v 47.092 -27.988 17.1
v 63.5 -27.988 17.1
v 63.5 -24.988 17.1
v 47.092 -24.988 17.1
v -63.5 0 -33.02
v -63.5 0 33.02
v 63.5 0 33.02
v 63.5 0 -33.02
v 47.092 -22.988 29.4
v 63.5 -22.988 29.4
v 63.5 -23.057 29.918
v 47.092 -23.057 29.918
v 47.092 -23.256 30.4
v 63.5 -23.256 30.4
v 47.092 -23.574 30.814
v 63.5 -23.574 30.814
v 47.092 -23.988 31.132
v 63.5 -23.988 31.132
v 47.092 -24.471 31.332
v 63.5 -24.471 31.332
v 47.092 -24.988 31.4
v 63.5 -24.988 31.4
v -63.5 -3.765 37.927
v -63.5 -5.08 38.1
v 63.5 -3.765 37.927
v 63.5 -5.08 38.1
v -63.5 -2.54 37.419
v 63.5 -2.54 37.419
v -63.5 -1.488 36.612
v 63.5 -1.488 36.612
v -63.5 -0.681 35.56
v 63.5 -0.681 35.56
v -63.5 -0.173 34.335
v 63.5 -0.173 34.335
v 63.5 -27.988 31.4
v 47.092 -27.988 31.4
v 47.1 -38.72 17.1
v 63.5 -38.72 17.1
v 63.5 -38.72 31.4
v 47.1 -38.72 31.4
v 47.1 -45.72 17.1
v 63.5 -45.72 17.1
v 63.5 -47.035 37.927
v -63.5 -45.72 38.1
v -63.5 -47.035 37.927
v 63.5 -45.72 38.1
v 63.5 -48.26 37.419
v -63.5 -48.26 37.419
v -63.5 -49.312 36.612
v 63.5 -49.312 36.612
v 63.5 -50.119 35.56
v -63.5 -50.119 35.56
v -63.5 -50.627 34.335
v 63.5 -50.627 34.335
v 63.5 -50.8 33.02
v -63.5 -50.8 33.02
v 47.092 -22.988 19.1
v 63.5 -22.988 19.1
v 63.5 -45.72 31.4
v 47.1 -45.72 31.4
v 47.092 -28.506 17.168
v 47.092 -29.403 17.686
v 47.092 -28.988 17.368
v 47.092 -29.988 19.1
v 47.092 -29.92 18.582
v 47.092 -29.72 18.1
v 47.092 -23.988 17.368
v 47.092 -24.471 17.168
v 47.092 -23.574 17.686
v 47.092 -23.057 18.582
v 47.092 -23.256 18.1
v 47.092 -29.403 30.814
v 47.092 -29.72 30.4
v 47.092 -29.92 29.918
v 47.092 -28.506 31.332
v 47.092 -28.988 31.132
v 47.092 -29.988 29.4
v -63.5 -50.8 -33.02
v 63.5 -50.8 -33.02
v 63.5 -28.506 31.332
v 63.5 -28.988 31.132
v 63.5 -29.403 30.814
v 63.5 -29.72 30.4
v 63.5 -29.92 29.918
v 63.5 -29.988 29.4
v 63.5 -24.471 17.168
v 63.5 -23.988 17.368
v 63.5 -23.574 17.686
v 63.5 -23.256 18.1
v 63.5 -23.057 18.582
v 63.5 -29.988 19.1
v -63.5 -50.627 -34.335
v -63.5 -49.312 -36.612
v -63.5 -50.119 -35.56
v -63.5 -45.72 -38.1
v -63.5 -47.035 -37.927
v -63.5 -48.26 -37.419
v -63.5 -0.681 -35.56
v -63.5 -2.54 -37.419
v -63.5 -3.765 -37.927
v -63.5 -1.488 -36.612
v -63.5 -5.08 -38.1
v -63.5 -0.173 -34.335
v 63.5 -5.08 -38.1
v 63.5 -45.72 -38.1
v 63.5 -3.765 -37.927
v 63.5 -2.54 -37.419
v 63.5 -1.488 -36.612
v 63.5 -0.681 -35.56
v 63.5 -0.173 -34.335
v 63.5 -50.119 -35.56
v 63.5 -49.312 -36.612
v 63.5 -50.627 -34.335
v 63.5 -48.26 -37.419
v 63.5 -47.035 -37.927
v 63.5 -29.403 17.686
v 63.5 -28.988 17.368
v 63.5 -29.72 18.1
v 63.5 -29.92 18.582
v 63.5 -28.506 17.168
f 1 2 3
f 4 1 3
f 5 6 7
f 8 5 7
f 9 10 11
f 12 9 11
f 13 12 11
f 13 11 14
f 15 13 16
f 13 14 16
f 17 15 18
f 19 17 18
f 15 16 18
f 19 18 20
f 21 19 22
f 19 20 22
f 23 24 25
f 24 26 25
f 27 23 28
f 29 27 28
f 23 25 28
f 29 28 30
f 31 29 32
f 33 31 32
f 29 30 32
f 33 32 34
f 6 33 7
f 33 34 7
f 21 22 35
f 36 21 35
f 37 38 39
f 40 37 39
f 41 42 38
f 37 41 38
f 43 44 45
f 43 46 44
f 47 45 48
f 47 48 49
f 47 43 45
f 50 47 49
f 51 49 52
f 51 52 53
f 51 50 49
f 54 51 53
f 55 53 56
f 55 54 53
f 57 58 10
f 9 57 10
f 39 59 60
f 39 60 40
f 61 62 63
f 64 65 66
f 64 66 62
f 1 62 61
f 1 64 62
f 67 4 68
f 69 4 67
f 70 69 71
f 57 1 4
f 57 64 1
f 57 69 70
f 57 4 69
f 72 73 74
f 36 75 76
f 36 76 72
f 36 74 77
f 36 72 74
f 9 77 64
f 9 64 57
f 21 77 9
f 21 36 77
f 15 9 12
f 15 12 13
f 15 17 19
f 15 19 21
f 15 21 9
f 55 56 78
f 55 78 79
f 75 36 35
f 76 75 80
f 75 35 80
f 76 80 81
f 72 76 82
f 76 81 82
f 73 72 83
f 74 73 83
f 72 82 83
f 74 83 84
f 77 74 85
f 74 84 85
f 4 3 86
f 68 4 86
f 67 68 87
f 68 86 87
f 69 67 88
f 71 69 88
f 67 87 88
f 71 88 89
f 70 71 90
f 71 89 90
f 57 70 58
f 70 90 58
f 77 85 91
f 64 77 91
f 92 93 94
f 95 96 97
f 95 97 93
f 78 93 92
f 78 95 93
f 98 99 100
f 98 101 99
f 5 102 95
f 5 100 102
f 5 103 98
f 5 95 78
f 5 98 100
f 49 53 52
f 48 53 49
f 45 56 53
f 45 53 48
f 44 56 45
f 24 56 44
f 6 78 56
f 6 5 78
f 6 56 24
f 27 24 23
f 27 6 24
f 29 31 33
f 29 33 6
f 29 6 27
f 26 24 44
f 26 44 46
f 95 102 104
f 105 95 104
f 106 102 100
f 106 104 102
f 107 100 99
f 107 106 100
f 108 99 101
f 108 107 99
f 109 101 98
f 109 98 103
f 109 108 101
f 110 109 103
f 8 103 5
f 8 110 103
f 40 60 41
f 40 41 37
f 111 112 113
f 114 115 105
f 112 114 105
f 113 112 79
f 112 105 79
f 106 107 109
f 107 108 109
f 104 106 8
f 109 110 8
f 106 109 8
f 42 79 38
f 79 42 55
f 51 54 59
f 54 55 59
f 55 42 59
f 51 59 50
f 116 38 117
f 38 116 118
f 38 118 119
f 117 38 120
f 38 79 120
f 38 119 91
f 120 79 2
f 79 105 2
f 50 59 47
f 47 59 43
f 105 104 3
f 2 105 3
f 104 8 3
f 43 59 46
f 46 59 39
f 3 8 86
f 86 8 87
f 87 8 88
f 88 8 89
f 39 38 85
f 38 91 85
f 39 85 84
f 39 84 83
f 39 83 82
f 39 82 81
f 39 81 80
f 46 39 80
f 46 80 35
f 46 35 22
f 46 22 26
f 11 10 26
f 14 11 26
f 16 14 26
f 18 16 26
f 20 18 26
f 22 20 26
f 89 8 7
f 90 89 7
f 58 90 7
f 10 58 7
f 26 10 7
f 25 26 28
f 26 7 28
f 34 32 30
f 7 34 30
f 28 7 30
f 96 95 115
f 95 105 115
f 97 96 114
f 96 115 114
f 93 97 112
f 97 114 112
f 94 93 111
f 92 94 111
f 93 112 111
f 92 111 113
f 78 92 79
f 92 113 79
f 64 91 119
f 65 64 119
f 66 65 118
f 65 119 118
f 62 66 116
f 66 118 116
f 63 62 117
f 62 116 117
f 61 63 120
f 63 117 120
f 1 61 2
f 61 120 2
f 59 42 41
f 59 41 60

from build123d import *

# Parameters (mm, degrees)
F0_W     = 127
F0_H     = 76.2
F1_DEPTH = 50.8
F2_R     = 5.08
F3_W     = 7
F3_H     = 14.3
F4_DEPTH = 16.4
F6_DEPTH = 16.4084


with BuildPart() as f1:
    # F0 (on Front) → F1 (new body)
    with BuildSketch(Plane.XZ):
        Rectangle(F0_W, F0_H)
    extrude(amount=F1_DEPTH)

    # F2
    f2_edges = [f1.edges().sort_by_distance(p)[0] for p in [
        (0, -50.8, 38.1),
        (0, 0, 38.1),
        (0, 0, -38.1),
        (0, -50.8, -38.1),
    ]]
    fillet(f2_edges, radius=F2_R)

    # F3 (on face) → F4 (cut)
    with BuildSketch(Plane.YZ.offset(63.5)):
        with Locations((-42.22, 24.25)):
            Rectangle(F3_W, F3_H)
    extrude(amount=-F4_DEPTH, mode=Mode.SUBTRACT)

    # F5 (on face) → F6 (cut)
    with BuildSketch(Plane.YZ.offset(63.5)):
        with BuildLine():
            Line((-24.988418, 31.4), (-27.988418, 31.4))
            ThreePointArc((-27.988418, 31.4), (-29.402631, 30.814213), (-29.988418, 29.4))
            Line((-29.988418, 29.4), (-29.988418, 19.1))
            ThreePointArc((-29.988418, 19.1), (-29.402631, 17.685786), (-27.988418, 17.1))
            Line((-27.988418, 17.1), (-24.988418, 17.1))
            ThreePointArc((-24.988418, 17.1), (-23.574204, 17.685786), (-22.988418, 19.1))
            Line((-22.988418, 19.1), (-22.988418, 29.4))
            ThreePointArc((-22.988418, 29.4), (-23.574204, 30.814213), (-24.988418, 31.4))
        make_face()
    extrude(amount=-F6_DEPTH, mode=Mode.SUBTRACT)


solid = f1.part
